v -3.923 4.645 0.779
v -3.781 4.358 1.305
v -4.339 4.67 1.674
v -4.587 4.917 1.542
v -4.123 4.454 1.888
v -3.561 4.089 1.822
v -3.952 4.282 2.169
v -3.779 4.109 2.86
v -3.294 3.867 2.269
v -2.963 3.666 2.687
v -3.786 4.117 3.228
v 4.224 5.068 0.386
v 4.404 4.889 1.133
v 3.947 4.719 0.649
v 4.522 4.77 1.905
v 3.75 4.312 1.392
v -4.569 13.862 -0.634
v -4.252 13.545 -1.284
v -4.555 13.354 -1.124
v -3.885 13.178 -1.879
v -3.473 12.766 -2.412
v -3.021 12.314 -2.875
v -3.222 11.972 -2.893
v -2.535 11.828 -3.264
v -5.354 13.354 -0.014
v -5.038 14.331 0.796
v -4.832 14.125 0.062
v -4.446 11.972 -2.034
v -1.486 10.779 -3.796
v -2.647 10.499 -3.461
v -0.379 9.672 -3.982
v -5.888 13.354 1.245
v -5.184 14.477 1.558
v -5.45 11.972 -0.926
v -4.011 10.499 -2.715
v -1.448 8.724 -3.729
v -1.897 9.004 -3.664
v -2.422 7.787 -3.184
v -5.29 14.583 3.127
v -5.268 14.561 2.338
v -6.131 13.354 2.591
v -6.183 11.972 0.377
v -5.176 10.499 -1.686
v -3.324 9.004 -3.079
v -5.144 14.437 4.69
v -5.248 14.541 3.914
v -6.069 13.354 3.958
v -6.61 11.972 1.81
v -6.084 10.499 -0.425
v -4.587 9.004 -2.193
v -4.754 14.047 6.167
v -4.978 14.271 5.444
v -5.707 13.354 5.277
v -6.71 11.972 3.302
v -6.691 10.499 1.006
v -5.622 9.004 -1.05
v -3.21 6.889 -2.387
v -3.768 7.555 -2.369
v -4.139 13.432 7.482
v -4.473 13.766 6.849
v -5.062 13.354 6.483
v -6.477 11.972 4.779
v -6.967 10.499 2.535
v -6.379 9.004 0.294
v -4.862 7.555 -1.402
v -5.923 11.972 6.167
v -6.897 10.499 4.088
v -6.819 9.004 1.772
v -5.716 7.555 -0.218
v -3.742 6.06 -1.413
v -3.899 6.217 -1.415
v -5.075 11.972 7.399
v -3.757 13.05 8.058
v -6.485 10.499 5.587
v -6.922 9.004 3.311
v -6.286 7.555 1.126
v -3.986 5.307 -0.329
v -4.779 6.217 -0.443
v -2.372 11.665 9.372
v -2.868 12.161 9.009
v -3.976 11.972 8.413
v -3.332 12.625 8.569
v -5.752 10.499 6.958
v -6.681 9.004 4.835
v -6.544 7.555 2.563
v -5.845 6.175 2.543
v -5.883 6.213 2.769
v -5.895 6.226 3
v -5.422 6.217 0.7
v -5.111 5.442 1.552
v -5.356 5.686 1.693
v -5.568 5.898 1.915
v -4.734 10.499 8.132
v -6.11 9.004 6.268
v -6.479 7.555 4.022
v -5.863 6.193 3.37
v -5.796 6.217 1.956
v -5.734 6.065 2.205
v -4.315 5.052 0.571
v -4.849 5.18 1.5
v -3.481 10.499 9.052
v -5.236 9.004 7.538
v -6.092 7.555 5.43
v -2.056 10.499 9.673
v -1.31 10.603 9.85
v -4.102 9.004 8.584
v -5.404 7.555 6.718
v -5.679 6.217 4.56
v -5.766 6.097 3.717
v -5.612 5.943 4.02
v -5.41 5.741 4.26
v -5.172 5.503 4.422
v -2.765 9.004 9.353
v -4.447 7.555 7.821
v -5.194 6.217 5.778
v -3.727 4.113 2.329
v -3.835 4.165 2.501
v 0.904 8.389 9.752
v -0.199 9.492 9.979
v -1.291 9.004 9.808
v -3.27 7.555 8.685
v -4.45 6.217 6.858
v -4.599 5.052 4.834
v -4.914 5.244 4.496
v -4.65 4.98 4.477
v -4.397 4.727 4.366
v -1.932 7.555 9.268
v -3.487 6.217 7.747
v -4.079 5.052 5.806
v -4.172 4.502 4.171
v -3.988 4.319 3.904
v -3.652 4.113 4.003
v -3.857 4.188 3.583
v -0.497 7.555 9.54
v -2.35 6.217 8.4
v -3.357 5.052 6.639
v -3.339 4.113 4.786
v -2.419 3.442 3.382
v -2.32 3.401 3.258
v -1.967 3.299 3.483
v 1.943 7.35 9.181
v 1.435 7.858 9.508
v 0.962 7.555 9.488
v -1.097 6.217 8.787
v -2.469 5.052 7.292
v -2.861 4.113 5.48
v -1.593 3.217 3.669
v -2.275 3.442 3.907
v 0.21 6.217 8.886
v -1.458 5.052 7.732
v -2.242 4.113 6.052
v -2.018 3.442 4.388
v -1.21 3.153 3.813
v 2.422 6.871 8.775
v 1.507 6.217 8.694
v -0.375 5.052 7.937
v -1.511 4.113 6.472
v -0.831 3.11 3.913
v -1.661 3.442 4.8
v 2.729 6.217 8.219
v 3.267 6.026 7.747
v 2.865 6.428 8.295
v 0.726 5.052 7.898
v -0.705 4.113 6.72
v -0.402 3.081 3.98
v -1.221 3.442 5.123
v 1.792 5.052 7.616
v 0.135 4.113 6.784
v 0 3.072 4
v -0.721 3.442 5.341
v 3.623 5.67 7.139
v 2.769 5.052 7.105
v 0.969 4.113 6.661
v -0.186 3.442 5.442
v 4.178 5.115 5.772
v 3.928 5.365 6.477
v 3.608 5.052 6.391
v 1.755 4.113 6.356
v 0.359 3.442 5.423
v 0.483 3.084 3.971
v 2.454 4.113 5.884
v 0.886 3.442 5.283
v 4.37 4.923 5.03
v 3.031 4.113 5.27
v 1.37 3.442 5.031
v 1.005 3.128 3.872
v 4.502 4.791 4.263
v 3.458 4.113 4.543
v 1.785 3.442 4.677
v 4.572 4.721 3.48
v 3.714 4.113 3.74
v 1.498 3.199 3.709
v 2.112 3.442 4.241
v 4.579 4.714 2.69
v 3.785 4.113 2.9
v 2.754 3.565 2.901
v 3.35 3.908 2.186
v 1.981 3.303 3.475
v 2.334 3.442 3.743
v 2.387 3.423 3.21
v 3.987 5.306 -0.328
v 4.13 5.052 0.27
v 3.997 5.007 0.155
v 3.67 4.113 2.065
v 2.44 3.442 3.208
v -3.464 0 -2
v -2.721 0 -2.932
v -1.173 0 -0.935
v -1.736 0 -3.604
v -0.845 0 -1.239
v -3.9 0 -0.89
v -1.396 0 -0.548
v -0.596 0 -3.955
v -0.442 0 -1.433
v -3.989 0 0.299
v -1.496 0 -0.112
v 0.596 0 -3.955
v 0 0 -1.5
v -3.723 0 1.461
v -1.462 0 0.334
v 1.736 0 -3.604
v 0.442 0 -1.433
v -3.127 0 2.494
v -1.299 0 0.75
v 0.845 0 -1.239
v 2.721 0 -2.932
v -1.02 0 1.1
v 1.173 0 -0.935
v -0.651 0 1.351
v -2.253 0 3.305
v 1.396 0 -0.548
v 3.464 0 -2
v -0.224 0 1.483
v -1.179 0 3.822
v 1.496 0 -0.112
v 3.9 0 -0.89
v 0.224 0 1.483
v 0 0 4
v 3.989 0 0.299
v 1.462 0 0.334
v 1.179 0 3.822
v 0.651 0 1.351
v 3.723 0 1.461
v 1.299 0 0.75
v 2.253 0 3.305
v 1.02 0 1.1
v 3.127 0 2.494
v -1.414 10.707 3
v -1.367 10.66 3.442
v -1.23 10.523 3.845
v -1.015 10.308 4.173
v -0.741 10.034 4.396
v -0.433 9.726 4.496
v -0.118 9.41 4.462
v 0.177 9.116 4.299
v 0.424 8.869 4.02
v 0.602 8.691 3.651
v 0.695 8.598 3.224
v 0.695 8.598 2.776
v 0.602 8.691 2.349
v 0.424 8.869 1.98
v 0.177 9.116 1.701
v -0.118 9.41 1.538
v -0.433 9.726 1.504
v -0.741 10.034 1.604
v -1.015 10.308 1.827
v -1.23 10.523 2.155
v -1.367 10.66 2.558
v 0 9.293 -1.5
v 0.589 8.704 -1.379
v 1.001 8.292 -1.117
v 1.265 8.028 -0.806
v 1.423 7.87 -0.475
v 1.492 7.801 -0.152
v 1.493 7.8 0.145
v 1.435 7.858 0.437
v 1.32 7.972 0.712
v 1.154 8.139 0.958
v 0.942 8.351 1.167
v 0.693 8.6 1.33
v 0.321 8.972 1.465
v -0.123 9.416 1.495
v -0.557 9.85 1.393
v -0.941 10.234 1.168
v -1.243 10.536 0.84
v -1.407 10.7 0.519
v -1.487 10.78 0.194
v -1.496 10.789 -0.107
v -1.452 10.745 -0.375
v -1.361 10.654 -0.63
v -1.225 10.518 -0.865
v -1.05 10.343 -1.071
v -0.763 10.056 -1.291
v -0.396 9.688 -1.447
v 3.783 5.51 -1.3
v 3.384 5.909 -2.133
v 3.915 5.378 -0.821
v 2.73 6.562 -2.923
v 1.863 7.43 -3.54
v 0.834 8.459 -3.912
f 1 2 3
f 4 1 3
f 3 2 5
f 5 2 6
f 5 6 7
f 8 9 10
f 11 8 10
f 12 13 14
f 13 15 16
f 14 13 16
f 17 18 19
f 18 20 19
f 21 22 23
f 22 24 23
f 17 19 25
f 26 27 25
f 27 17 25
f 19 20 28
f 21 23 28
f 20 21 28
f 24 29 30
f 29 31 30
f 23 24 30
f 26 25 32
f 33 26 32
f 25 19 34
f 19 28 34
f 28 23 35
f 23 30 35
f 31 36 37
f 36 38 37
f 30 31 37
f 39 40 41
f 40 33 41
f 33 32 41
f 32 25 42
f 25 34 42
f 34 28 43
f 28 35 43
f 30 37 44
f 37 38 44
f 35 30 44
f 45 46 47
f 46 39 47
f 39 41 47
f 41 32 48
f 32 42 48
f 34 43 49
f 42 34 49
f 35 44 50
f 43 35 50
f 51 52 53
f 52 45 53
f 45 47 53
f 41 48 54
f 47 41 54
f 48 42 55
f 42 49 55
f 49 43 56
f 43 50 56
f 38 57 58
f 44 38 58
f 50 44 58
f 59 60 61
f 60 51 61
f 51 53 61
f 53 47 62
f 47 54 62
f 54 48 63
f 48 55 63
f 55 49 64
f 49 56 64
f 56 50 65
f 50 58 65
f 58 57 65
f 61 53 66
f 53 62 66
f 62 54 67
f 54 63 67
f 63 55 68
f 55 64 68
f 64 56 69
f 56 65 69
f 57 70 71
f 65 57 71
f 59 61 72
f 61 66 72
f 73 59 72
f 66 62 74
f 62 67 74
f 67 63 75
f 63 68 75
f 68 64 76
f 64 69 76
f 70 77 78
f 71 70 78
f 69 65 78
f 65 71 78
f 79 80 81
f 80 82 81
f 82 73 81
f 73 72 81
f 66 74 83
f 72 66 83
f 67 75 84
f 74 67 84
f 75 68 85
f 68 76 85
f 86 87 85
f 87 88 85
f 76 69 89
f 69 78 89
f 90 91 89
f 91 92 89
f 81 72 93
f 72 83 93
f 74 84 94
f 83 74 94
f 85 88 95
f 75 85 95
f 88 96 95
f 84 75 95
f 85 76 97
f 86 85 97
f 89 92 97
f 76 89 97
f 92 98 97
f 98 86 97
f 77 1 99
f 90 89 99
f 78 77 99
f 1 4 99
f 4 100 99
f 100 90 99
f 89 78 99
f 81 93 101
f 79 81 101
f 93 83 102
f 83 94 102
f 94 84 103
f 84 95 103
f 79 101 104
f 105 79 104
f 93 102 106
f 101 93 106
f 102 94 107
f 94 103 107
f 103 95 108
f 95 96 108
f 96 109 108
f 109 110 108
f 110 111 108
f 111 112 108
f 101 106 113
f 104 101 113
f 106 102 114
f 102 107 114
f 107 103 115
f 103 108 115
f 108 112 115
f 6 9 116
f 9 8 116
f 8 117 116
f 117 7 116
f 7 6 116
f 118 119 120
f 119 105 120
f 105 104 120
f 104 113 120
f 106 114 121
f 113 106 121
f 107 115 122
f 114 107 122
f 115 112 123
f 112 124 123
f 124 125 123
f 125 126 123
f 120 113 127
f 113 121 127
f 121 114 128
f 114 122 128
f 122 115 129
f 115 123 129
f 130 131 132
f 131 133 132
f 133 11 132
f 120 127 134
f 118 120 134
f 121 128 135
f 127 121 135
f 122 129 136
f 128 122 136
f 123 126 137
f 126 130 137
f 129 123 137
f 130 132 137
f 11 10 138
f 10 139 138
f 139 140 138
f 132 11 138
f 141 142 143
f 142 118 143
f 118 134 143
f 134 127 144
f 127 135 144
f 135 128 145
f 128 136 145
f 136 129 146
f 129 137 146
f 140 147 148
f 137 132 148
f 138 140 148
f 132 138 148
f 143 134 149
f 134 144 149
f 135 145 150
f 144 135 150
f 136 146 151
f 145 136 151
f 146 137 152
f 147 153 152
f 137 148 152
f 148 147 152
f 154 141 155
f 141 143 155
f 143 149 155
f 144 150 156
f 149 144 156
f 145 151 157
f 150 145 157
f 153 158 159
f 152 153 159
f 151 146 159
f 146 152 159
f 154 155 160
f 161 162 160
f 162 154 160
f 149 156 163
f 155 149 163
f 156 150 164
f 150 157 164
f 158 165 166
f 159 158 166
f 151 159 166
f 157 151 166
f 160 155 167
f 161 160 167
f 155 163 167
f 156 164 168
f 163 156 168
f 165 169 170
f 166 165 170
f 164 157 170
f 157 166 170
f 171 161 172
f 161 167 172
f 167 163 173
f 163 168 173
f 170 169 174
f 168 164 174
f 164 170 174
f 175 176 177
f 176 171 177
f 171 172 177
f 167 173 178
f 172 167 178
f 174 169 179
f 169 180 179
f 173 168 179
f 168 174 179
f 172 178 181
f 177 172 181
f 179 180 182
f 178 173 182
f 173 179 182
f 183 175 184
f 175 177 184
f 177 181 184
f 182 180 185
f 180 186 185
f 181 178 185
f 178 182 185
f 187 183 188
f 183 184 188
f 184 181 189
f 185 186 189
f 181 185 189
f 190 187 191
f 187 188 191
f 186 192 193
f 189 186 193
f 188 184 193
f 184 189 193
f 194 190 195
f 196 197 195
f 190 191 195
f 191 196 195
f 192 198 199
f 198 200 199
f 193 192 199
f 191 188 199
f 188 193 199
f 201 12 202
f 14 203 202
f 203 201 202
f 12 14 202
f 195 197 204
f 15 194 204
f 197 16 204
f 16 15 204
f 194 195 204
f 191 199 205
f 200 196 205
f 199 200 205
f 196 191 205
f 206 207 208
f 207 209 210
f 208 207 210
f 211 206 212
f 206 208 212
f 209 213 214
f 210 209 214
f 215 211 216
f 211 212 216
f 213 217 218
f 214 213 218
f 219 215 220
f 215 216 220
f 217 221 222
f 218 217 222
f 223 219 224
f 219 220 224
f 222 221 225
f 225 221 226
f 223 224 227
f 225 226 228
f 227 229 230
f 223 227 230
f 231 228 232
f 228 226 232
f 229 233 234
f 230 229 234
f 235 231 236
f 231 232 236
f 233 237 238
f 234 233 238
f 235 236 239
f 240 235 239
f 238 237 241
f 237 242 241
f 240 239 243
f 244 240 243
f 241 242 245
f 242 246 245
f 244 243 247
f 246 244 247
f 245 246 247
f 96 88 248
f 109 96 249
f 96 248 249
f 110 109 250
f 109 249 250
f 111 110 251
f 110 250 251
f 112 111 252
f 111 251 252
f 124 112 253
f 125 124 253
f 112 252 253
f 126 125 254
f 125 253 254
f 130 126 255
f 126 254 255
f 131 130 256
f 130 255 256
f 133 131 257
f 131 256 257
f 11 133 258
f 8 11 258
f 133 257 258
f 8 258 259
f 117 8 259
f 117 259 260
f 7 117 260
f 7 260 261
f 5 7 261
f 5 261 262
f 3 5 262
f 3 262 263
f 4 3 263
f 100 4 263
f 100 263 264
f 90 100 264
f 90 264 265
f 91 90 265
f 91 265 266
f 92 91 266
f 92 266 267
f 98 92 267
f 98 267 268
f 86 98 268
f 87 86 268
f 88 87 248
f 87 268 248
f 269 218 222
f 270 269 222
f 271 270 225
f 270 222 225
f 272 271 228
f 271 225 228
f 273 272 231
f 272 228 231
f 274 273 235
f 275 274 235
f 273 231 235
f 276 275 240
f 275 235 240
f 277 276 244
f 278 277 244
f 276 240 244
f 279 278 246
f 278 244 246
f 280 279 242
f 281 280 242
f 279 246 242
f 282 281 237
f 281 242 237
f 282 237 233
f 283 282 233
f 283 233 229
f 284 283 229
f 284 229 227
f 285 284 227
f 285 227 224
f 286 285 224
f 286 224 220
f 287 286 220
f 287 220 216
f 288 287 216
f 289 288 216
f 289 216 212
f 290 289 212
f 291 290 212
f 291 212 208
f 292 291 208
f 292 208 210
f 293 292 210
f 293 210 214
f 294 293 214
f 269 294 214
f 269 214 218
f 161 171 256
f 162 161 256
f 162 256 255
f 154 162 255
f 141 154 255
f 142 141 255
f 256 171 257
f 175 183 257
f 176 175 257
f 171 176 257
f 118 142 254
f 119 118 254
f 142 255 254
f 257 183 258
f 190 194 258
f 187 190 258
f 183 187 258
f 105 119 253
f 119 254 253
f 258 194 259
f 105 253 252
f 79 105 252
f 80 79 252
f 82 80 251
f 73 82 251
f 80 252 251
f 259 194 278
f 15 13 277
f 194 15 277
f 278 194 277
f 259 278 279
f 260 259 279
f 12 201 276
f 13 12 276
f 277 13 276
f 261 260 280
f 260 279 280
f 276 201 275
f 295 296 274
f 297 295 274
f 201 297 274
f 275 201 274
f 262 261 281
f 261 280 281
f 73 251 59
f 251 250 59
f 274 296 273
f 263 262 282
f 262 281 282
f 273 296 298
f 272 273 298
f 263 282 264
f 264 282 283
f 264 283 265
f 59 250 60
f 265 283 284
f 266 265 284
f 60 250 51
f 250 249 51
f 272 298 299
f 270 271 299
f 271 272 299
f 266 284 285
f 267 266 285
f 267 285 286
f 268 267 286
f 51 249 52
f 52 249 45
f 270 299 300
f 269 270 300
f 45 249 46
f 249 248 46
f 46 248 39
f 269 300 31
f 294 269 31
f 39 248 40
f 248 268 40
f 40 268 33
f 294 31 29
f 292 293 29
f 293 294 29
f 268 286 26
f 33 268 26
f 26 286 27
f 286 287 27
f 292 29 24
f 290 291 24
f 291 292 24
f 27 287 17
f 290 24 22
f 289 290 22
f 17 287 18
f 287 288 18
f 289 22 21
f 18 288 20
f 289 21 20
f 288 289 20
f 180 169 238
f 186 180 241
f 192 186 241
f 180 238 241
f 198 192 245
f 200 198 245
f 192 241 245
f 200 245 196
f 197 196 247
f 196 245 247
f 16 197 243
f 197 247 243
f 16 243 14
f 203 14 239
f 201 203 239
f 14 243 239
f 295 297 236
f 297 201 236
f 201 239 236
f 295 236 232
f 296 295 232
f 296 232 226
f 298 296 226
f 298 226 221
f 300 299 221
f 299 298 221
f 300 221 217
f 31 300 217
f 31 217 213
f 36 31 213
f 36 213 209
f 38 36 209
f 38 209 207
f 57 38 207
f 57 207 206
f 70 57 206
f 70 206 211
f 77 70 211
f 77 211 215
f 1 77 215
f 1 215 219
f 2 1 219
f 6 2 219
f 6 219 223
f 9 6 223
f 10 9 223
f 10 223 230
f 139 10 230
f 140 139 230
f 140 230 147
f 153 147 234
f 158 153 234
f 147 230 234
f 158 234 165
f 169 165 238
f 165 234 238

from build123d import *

# Parameters (mm, degrees)
SKETCH1_R               = 4
BOSS_EXTRUDE1_DEPTH     = 10
CUT_EXTRUDE1_DEPTH      = 21.928449536
CUT_EXTRUDE1_DEPTH_BACK = 21.928449536
SKETCH9_R               = 1.5
CUT_EXTRUDE5_DEPTH      = 19.276446179
SKETCH7_R               = 1.5
CUT_EXTRUDE3_DEPTH      = 20.008489752


with BuildPart() as part:
    # Sketch1 → Boss-Extrude1 (new body)
    with BuildSketch(Plane(origin=(0, 0, 0), x_dir=(1, 0, 0), z_dir=(0, 1, 0))):
        with Locations(Location((0, 0, 0), (0, 0, 270))):
            Circle(SKETCH1_R)
    extrude(amount=BOSS_EXTRUDE1_DEPTH)

    # Sketch2 → Revolve2 (revolve)
    with BuildSketch(Plane(origin=(0, 0, 0), x_dir=(0, 0, -1), z_dir=(1, 0, 0))):
        with BuildLine():
            Line((-3, 3), (-3, 17))
            ThreePointArc((-3, 17), (4, 10), (-3, 3))
        make_face()
    revolve(axis=Axis((0, 3, 3), (0, 1, 0)))

    # Sketch5 → Cut-Extrude1 (cut, two sides: drawn at the far end of the back side and taken through both)
    with BuildSketch(Plane.XY.offset(-CUT_EXTRUDE1_DEPTH_BACK)):
        Polygon((-7, 17), (7, 17), (7, 3), (6.646446609, 2.646446609), (-7.353553391, 16.646446609), align=None)
    extrude(amount=CUT_EXTRUDE1_DEPTH + CUT_EXTRUDE1_DEPTH_BACK, mode=Mode.SUBTRACT)

    # Sketch9 → Cut-Extrude5 (cut, through all)
    with BuildSketch(Plane(origin=(4.646446609, 4.646446609, 0), x_dir=(0, 0, -1), z_dir=(0.7071067811865462, 0.7071067811865489, 0))):
        with Locations(Location((-3, 7.071067812, 0), (0, 0, 90))):
            Circle(SKETCH9_R)
    extrude(amount=-CUT_EXTRUDE5_DEPTH, mode=Mode.SUBTRACT)

    # Sketch7 → Cut-Extrude3 (cut, through all)
    with BuildSketch(Plane.XZ):
        with Locations(Location((0, 0, 0), (0, 0, 270))):
            Circle(SKETCH7_R)
    extrude(amount=-CUT_EXTRUDE3_DEPTH, mode=Mode.SUBTRACT)


solid = part.part
